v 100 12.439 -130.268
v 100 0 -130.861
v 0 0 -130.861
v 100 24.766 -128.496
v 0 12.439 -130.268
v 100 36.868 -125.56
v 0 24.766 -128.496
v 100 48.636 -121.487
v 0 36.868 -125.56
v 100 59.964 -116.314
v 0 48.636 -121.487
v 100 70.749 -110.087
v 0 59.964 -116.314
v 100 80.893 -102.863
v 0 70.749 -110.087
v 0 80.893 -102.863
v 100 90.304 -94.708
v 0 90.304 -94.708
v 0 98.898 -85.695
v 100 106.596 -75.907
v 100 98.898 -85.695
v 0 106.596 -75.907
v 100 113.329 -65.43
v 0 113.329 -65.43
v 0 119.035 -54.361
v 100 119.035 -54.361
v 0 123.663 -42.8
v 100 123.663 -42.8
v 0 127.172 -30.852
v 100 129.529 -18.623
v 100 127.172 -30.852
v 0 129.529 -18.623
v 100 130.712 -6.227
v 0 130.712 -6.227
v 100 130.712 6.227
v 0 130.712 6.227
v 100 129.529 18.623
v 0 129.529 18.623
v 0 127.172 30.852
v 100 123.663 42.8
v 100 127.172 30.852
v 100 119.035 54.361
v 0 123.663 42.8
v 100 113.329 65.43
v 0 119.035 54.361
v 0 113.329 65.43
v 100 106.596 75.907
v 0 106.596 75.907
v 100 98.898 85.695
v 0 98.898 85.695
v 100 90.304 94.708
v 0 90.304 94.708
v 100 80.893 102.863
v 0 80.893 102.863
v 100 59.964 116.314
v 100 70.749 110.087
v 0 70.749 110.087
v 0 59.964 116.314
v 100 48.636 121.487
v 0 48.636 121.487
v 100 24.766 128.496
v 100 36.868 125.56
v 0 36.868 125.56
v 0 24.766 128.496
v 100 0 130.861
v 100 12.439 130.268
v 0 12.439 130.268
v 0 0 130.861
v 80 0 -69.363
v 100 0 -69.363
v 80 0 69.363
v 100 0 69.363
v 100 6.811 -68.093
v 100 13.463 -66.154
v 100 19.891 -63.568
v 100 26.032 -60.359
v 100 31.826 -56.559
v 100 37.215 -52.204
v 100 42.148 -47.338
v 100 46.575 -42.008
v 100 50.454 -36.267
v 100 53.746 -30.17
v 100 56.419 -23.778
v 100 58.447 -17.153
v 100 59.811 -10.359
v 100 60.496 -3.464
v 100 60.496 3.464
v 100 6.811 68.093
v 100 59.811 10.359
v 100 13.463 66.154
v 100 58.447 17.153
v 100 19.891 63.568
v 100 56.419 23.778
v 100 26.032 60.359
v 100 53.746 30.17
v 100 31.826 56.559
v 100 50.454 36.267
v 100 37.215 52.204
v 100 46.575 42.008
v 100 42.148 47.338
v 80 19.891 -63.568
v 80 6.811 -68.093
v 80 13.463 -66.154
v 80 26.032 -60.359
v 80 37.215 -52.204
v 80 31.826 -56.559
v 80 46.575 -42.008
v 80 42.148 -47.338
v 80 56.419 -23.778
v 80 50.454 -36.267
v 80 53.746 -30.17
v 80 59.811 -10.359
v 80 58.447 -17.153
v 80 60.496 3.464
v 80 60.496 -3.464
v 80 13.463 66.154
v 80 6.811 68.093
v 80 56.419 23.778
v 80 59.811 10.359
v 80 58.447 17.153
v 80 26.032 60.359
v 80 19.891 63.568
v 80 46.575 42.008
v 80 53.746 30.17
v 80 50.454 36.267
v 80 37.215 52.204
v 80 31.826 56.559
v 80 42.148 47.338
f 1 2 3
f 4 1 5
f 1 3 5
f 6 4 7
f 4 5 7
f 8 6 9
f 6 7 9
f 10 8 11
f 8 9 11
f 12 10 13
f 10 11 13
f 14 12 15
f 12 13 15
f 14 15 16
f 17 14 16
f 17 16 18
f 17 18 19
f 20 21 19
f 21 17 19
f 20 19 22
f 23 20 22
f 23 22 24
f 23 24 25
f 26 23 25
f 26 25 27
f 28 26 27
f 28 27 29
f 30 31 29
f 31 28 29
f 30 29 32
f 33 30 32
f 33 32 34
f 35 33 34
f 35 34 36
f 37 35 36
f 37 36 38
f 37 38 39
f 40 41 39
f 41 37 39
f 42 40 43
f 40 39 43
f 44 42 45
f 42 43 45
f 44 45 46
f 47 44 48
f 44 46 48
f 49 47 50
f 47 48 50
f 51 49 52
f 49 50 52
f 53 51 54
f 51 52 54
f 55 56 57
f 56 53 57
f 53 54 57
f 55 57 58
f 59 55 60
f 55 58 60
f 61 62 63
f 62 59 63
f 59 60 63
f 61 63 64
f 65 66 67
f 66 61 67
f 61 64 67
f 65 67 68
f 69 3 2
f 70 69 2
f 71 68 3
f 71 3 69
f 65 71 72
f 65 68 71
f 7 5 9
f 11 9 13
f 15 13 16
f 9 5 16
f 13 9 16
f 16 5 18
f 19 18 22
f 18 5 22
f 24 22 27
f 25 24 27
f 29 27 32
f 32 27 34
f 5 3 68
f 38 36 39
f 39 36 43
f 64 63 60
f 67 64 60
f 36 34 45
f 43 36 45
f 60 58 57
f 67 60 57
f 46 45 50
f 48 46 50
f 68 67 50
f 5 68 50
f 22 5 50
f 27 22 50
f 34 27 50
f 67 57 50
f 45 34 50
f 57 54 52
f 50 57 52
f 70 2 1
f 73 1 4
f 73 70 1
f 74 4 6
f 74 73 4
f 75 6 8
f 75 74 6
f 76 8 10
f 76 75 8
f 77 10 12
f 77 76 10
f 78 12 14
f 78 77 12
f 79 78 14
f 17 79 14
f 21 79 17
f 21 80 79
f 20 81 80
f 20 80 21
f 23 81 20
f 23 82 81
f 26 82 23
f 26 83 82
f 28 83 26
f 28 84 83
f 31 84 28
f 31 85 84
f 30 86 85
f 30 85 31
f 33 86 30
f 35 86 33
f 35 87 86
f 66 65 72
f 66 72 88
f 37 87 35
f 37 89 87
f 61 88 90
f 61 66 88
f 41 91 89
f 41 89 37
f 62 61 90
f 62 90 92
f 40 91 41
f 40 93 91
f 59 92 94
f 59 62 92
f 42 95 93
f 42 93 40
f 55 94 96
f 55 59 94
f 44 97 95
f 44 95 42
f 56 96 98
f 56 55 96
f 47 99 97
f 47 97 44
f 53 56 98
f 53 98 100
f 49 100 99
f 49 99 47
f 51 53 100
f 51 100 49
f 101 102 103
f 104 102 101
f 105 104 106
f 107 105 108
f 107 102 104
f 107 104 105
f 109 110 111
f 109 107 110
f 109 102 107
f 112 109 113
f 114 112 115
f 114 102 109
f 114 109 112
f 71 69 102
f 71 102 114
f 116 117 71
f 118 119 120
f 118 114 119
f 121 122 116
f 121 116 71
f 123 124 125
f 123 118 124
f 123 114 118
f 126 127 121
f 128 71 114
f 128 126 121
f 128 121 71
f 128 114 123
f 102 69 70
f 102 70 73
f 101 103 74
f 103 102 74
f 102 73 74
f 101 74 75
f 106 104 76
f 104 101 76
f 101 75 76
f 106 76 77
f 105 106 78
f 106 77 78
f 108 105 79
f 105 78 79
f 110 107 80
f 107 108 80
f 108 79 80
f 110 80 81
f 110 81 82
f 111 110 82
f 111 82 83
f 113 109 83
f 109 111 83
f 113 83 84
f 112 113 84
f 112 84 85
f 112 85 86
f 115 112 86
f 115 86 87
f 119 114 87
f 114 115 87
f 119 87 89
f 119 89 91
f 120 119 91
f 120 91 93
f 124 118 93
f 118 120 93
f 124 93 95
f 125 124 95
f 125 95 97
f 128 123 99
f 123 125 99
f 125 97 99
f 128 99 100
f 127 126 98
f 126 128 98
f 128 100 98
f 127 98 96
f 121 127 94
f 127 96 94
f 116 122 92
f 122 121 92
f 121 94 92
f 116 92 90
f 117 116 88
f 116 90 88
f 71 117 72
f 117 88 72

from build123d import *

# Parameters (mm, degrees)
F0_R     = 130.860579
F1_DEPTH = 100
F2_R     = 70
F3_DEPTH = 20
F4_W     = 309.986204
F4_H     = 334.951535
F5_DEPTH = 150


with BuildPart() as f1:
    # F0 (on Right) → F1 (new body)
    with BuildSketch(Plane.YZ):
        Circle(F0_R)
    extrude(amount=F1_DEPTH)

    # F2 (on face) → F3 (cut)
    with BuildSketch(Plane.YZ.offset(100)):
        with Locations((-9.41853, 0)):
            Circle(F2_R)
    extrude(amount=-F3_DEPTH, mode=Mode.SUBTRACT)

    # F4 (on Front) → F5 (cut)
    with BuildSketch(Plane.XZ):
        with Locations((44.957653, 2.534858)):
            Rectangle(F4_W, F4_H)
    extrude(amount=F5_DEPTH, mode=Mode.SUBTRACT)


solid = f1.part
